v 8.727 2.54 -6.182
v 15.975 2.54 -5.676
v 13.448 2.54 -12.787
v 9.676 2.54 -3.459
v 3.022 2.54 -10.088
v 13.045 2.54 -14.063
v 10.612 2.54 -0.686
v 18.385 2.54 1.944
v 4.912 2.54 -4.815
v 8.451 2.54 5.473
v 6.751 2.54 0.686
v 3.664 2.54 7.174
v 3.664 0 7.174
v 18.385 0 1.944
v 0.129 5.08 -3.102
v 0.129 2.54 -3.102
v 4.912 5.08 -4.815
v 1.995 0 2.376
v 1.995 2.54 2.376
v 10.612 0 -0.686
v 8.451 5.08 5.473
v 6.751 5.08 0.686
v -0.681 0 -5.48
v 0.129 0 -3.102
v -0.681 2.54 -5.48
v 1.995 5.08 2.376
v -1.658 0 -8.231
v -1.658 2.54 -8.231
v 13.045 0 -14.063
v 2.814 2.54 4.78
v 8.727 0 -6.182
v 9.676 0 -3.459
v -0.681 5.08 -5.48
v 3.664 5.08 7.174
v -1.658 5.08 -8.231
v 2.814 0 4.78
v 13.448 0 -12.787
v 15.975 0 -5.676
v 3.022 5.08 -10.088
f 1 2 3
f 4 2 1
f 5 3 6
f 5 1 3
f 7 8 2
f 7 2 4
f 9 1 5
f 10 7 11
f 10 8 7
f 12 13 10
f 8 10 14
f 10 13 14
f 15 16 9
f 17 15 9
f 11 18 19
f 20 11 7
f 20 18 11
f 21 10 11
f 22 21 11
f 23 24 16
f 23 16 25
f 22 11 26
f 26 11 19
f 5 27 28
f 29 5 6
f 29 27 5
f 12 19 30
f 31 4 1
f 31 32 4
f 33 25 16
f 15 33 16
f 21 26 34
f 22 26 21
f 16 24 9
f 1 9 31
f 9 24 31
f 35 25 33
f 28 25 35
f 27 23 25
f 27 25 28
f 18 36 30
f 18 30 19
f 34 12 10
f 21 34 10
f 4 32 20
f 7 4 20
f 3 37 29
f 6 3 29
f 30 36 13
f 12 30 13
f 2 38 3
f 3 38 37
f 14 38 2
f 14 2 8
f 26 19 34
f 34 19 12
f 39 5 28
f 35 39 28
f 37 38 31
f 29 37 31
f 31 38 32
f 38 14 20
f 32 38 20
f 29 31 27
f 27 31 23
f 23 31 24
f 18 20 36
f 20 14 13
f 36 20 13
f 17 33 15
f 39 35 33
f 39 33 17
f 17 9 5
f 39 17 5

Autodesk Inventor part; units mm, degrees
ref_plane "YZ Plane" through (0, 0, 0) normal (1, 0, 0) x (0, 1, 0)
ref_plane "XZ Plane" through (0, 0, 0) normal (0, 1, 0) x (-1, 0, 0)
ref_plane "XY Plane" through (0, 0, 0) normal (0, 0, 1) x (1, 0, 0)
sketch "Sketch1" plane through (0, 0, 0) normal (0, 1, 0) x (-1, 0, 0)
  line L0 (6.5186, 9.6083) -> (7.4793, 6.9251)
  line L1 (9.9904, -0.6602) -> (10.9974, -3.3263)
  line L2 (6.9989, 8.2667) -> (-2.8141, 4.7803)
  line L3 (10.4939, -1.9933) -> (0.6808, -5.4797)
  circle A0 centre (-12.8288, -4.5578) radius 1.5875
  circle A1 centre (-12.8288, -4.5578) radius 3.3389
  line L4 (-2.8141, 4.7803) -> (-12.8288, -4.5578)
  line L5 (-12.8288, -4.5578) -> (0.6808, -5.4797)
  line L6 (-2.8141, 4.7803) -> (-15.056, 0.431)
  line L7 (-12.8288, -4.5578) -> (-14.6522, 0.5745)
  line L8 (-14.6522, 0.5745) -> (-2.8141, 4.7803)
  line L9 (-12.8288, -4.5578) -> (-10.8725, -10.064)
  line L10 (0.6808, -5.4797) -> (-10.8725, -10.064)
  line L11 (10.4939, -1.9933) -> (11.3914, -4.3694)
  line L12 (11.3914, -4.3694) -> (9.5964, 0.3829)
  line L13 (9.5964, 0.3829) -> (-15.056, -8.4497)
  line L14 (-12.8288, -4.5578) -> (-15.975, -5.6756)
  line L15 (-15.9757, -5.6736) -> (-13.4484, -12.787)
  line L16 (-13.4484, -12.787) -> (-12.5471, -15.637)
  line L17 (11.3914, -4.3694) -> (-13.0447, -14.0634)
  line L18 (-15.9757, -5.6736) -> (-19.6824, 6.0465)
  line L19 (6.9989, 8.2667) -> (7.8493, 5.8733)
  line L20 (7.8493, 5.8733) -> (6.1486, 10.6602)
  line L21 (6.1486, 10.6602) -> (-18.3849, 1.9439)
  line L22 (7.8493, 5.8733) -> (-16.8521, -2.9027)
  line L23 (-2.8141, 4.7803) -> (0.6808, -5.4797)
  line L24 (-2.8141, 4.7803) -> (-3.6645, 7.1738)
  line L25 (0.6808, -5.4797) -> (1.6582, -8.2307)
  line L26 (-1.9951, 2.3758) -> (-16.8521, -2.9027)
  line L27 (-3.6645, 7.1738) -> (-18.3849, 1.9439)
  line L28 (-13.0447, -14.0634) -> (1.6582, -8.2307)
  line L29 (-0.1292, -3.1017) -> (-11.8537, -7.3024)
  line L30 (-0.1292, -3.1017) -> (1.6582, -8.2307)
  line L31 (-12.8288, -4.5578) -> (-9.6759, -3.4591)
  line L32 (-9.6759, -3.4591) -> (-6.8384, -11.6013)
  line L33 (-9.6759, -3.4591) -> (-12.2361, 4.1284)
  point P0 (0, 0)
  point P1 (-8.727, -6.1821)
  point P2 (-10.6118, -0.6856)
  point P3 (-16.045, -5.4546)
  point P4 (-15.9742, -5.6777)
  dimension "d0" = 10.414
  dimension "d1" = 10.414
  dimension "d2" = 12.2419
  dimension "d3" = 12.4297
  dimension "d4" = 5.1323
  dimension "d5" = 5.5062
  dimension "d6" = 13.6929
  dimension "d7" = 13.5096
  dimension "d8" = 2.54
  dimension "d9" = 5.08
  dimension "d10" = 2.54
  dimension "d11" = 5.08
sketch "Sketch2" plane through (0, 0, 0) normal (0, 1, 0) x (-1, 0, 0)
  point P0 (0, 0)
extrude "Extrusion1" add sketch "Sketch1" along normal blind 2.54 contours L18 L22 A1 | L23 L5 L13 | L10 L32 L13 L5 | L25 L17 L32 L10 | L22 L4 L23 | L32 L17 L16 L15 L13 A1 L9 L10 | L10 L9 A1 L13 L32 | L32 L13 A1 L5 | L5 A1 L32 | L22 L33 L6 L4 | L6 L33 L21 L24 | L5 A0 L31 A1 | A1 L13 L9 A0 L5 | L31 A0 L4 A1 | A1 L4 L33 | A1 L9 L13 | L4 A1 L22 L33 | L22 A1 L7 L6 L33 | L6 L7 A1 L22 L18 L21 L33 | A1 L13 L9 | L5 L31 A0 | A0 L9 L5 | L4 A0 L7 L22 A1 | L31 L4 A0 | L13 A1 L14 A0 L9 | L22 L7 A1 | L13 L15 A1 | A0 L14 L9 | L7 A0 L4 | L14 A0 L7 | L7 L22 A1 | L7 A0 L14 A1 L22
sketch "Sketch3" plane through (0, 2.54, 0) normal (0, 1, 0) x (1, 0, 0)
  line L0 (8.727, 6.1821) -> (6.8384, 11.6013)
  line L1 (13.0447, 14.0634) -> (-1.6582, 8.2307) projected
  line L2 (10.6118, 0.6856) -> (12.2361, -4.1284)
  line L3 (3.6645, -7.1738) -> (18.3849, -1.9439) projected
  line L4 (8.727, 6.1821) -> (9.6759, 3.4591) projected
  line L5 (9.6759, 3.4591) -> (10.6118, 0.6856) projected
  point P0 (0, 0)
sketch "Sketch4" plane through (0, 2.54, 0) normal (0, 1, 0) x (1, 0, 0)
  line L0 (2.8141, -4.7803) -> (3.6645, -7.1738) projected
  line L1 (1.9951, -2.3758) -> (3.6645, -7.1738)
  line L2 (3.6645, -7.1738) -> (8.4513, -5.4731)
  line L3 (3.6645, -7.1738) -> (18.3849, -1.9439) projected
  line L4 (8.4513, -5.4731) -> (6.7507, -0.6862)
  line L5 (10.6118, 0.6856) -> (1.9951, -2.3758) projected
  line L6 (-0.6808, 5.4797) -> (0.1292, 3.1017) projected
  line L7 (0.1292, 3.1017) -> (4.9115, 4.8151)
  line L8 (0.1292, 3.1017) -> (8.727, 6.1821) projected
  line L9 (4.9115, 4.8151) -> (3.0225, 10.0875)
  line L10 (13.0447, 14.0634) -> (-1.6582, 8.2307) projected
  line L11 (3.6645, -7.1738) -> (18.3849, -1.9439) projected
  line L12 (-1.6582, 8.2307) -> (-0.6808, 5.4797) projected
  line L13 (-0.6808, 5.4797) -> (-1.6582, 8.2307)
  point P0 (0, 0)
  dimension "d14" = 5.08
  dimension "d15" = 5.08
sketch "Sketch5" plane through (0, 2.54, 0) normal (0, 1, 0) x (1, 0, 0)
  point P0 (0, 0)
extrude "Extrusion2" add sketch "Sketch4" along normal blind 2.54
properties part number "filendholder"
